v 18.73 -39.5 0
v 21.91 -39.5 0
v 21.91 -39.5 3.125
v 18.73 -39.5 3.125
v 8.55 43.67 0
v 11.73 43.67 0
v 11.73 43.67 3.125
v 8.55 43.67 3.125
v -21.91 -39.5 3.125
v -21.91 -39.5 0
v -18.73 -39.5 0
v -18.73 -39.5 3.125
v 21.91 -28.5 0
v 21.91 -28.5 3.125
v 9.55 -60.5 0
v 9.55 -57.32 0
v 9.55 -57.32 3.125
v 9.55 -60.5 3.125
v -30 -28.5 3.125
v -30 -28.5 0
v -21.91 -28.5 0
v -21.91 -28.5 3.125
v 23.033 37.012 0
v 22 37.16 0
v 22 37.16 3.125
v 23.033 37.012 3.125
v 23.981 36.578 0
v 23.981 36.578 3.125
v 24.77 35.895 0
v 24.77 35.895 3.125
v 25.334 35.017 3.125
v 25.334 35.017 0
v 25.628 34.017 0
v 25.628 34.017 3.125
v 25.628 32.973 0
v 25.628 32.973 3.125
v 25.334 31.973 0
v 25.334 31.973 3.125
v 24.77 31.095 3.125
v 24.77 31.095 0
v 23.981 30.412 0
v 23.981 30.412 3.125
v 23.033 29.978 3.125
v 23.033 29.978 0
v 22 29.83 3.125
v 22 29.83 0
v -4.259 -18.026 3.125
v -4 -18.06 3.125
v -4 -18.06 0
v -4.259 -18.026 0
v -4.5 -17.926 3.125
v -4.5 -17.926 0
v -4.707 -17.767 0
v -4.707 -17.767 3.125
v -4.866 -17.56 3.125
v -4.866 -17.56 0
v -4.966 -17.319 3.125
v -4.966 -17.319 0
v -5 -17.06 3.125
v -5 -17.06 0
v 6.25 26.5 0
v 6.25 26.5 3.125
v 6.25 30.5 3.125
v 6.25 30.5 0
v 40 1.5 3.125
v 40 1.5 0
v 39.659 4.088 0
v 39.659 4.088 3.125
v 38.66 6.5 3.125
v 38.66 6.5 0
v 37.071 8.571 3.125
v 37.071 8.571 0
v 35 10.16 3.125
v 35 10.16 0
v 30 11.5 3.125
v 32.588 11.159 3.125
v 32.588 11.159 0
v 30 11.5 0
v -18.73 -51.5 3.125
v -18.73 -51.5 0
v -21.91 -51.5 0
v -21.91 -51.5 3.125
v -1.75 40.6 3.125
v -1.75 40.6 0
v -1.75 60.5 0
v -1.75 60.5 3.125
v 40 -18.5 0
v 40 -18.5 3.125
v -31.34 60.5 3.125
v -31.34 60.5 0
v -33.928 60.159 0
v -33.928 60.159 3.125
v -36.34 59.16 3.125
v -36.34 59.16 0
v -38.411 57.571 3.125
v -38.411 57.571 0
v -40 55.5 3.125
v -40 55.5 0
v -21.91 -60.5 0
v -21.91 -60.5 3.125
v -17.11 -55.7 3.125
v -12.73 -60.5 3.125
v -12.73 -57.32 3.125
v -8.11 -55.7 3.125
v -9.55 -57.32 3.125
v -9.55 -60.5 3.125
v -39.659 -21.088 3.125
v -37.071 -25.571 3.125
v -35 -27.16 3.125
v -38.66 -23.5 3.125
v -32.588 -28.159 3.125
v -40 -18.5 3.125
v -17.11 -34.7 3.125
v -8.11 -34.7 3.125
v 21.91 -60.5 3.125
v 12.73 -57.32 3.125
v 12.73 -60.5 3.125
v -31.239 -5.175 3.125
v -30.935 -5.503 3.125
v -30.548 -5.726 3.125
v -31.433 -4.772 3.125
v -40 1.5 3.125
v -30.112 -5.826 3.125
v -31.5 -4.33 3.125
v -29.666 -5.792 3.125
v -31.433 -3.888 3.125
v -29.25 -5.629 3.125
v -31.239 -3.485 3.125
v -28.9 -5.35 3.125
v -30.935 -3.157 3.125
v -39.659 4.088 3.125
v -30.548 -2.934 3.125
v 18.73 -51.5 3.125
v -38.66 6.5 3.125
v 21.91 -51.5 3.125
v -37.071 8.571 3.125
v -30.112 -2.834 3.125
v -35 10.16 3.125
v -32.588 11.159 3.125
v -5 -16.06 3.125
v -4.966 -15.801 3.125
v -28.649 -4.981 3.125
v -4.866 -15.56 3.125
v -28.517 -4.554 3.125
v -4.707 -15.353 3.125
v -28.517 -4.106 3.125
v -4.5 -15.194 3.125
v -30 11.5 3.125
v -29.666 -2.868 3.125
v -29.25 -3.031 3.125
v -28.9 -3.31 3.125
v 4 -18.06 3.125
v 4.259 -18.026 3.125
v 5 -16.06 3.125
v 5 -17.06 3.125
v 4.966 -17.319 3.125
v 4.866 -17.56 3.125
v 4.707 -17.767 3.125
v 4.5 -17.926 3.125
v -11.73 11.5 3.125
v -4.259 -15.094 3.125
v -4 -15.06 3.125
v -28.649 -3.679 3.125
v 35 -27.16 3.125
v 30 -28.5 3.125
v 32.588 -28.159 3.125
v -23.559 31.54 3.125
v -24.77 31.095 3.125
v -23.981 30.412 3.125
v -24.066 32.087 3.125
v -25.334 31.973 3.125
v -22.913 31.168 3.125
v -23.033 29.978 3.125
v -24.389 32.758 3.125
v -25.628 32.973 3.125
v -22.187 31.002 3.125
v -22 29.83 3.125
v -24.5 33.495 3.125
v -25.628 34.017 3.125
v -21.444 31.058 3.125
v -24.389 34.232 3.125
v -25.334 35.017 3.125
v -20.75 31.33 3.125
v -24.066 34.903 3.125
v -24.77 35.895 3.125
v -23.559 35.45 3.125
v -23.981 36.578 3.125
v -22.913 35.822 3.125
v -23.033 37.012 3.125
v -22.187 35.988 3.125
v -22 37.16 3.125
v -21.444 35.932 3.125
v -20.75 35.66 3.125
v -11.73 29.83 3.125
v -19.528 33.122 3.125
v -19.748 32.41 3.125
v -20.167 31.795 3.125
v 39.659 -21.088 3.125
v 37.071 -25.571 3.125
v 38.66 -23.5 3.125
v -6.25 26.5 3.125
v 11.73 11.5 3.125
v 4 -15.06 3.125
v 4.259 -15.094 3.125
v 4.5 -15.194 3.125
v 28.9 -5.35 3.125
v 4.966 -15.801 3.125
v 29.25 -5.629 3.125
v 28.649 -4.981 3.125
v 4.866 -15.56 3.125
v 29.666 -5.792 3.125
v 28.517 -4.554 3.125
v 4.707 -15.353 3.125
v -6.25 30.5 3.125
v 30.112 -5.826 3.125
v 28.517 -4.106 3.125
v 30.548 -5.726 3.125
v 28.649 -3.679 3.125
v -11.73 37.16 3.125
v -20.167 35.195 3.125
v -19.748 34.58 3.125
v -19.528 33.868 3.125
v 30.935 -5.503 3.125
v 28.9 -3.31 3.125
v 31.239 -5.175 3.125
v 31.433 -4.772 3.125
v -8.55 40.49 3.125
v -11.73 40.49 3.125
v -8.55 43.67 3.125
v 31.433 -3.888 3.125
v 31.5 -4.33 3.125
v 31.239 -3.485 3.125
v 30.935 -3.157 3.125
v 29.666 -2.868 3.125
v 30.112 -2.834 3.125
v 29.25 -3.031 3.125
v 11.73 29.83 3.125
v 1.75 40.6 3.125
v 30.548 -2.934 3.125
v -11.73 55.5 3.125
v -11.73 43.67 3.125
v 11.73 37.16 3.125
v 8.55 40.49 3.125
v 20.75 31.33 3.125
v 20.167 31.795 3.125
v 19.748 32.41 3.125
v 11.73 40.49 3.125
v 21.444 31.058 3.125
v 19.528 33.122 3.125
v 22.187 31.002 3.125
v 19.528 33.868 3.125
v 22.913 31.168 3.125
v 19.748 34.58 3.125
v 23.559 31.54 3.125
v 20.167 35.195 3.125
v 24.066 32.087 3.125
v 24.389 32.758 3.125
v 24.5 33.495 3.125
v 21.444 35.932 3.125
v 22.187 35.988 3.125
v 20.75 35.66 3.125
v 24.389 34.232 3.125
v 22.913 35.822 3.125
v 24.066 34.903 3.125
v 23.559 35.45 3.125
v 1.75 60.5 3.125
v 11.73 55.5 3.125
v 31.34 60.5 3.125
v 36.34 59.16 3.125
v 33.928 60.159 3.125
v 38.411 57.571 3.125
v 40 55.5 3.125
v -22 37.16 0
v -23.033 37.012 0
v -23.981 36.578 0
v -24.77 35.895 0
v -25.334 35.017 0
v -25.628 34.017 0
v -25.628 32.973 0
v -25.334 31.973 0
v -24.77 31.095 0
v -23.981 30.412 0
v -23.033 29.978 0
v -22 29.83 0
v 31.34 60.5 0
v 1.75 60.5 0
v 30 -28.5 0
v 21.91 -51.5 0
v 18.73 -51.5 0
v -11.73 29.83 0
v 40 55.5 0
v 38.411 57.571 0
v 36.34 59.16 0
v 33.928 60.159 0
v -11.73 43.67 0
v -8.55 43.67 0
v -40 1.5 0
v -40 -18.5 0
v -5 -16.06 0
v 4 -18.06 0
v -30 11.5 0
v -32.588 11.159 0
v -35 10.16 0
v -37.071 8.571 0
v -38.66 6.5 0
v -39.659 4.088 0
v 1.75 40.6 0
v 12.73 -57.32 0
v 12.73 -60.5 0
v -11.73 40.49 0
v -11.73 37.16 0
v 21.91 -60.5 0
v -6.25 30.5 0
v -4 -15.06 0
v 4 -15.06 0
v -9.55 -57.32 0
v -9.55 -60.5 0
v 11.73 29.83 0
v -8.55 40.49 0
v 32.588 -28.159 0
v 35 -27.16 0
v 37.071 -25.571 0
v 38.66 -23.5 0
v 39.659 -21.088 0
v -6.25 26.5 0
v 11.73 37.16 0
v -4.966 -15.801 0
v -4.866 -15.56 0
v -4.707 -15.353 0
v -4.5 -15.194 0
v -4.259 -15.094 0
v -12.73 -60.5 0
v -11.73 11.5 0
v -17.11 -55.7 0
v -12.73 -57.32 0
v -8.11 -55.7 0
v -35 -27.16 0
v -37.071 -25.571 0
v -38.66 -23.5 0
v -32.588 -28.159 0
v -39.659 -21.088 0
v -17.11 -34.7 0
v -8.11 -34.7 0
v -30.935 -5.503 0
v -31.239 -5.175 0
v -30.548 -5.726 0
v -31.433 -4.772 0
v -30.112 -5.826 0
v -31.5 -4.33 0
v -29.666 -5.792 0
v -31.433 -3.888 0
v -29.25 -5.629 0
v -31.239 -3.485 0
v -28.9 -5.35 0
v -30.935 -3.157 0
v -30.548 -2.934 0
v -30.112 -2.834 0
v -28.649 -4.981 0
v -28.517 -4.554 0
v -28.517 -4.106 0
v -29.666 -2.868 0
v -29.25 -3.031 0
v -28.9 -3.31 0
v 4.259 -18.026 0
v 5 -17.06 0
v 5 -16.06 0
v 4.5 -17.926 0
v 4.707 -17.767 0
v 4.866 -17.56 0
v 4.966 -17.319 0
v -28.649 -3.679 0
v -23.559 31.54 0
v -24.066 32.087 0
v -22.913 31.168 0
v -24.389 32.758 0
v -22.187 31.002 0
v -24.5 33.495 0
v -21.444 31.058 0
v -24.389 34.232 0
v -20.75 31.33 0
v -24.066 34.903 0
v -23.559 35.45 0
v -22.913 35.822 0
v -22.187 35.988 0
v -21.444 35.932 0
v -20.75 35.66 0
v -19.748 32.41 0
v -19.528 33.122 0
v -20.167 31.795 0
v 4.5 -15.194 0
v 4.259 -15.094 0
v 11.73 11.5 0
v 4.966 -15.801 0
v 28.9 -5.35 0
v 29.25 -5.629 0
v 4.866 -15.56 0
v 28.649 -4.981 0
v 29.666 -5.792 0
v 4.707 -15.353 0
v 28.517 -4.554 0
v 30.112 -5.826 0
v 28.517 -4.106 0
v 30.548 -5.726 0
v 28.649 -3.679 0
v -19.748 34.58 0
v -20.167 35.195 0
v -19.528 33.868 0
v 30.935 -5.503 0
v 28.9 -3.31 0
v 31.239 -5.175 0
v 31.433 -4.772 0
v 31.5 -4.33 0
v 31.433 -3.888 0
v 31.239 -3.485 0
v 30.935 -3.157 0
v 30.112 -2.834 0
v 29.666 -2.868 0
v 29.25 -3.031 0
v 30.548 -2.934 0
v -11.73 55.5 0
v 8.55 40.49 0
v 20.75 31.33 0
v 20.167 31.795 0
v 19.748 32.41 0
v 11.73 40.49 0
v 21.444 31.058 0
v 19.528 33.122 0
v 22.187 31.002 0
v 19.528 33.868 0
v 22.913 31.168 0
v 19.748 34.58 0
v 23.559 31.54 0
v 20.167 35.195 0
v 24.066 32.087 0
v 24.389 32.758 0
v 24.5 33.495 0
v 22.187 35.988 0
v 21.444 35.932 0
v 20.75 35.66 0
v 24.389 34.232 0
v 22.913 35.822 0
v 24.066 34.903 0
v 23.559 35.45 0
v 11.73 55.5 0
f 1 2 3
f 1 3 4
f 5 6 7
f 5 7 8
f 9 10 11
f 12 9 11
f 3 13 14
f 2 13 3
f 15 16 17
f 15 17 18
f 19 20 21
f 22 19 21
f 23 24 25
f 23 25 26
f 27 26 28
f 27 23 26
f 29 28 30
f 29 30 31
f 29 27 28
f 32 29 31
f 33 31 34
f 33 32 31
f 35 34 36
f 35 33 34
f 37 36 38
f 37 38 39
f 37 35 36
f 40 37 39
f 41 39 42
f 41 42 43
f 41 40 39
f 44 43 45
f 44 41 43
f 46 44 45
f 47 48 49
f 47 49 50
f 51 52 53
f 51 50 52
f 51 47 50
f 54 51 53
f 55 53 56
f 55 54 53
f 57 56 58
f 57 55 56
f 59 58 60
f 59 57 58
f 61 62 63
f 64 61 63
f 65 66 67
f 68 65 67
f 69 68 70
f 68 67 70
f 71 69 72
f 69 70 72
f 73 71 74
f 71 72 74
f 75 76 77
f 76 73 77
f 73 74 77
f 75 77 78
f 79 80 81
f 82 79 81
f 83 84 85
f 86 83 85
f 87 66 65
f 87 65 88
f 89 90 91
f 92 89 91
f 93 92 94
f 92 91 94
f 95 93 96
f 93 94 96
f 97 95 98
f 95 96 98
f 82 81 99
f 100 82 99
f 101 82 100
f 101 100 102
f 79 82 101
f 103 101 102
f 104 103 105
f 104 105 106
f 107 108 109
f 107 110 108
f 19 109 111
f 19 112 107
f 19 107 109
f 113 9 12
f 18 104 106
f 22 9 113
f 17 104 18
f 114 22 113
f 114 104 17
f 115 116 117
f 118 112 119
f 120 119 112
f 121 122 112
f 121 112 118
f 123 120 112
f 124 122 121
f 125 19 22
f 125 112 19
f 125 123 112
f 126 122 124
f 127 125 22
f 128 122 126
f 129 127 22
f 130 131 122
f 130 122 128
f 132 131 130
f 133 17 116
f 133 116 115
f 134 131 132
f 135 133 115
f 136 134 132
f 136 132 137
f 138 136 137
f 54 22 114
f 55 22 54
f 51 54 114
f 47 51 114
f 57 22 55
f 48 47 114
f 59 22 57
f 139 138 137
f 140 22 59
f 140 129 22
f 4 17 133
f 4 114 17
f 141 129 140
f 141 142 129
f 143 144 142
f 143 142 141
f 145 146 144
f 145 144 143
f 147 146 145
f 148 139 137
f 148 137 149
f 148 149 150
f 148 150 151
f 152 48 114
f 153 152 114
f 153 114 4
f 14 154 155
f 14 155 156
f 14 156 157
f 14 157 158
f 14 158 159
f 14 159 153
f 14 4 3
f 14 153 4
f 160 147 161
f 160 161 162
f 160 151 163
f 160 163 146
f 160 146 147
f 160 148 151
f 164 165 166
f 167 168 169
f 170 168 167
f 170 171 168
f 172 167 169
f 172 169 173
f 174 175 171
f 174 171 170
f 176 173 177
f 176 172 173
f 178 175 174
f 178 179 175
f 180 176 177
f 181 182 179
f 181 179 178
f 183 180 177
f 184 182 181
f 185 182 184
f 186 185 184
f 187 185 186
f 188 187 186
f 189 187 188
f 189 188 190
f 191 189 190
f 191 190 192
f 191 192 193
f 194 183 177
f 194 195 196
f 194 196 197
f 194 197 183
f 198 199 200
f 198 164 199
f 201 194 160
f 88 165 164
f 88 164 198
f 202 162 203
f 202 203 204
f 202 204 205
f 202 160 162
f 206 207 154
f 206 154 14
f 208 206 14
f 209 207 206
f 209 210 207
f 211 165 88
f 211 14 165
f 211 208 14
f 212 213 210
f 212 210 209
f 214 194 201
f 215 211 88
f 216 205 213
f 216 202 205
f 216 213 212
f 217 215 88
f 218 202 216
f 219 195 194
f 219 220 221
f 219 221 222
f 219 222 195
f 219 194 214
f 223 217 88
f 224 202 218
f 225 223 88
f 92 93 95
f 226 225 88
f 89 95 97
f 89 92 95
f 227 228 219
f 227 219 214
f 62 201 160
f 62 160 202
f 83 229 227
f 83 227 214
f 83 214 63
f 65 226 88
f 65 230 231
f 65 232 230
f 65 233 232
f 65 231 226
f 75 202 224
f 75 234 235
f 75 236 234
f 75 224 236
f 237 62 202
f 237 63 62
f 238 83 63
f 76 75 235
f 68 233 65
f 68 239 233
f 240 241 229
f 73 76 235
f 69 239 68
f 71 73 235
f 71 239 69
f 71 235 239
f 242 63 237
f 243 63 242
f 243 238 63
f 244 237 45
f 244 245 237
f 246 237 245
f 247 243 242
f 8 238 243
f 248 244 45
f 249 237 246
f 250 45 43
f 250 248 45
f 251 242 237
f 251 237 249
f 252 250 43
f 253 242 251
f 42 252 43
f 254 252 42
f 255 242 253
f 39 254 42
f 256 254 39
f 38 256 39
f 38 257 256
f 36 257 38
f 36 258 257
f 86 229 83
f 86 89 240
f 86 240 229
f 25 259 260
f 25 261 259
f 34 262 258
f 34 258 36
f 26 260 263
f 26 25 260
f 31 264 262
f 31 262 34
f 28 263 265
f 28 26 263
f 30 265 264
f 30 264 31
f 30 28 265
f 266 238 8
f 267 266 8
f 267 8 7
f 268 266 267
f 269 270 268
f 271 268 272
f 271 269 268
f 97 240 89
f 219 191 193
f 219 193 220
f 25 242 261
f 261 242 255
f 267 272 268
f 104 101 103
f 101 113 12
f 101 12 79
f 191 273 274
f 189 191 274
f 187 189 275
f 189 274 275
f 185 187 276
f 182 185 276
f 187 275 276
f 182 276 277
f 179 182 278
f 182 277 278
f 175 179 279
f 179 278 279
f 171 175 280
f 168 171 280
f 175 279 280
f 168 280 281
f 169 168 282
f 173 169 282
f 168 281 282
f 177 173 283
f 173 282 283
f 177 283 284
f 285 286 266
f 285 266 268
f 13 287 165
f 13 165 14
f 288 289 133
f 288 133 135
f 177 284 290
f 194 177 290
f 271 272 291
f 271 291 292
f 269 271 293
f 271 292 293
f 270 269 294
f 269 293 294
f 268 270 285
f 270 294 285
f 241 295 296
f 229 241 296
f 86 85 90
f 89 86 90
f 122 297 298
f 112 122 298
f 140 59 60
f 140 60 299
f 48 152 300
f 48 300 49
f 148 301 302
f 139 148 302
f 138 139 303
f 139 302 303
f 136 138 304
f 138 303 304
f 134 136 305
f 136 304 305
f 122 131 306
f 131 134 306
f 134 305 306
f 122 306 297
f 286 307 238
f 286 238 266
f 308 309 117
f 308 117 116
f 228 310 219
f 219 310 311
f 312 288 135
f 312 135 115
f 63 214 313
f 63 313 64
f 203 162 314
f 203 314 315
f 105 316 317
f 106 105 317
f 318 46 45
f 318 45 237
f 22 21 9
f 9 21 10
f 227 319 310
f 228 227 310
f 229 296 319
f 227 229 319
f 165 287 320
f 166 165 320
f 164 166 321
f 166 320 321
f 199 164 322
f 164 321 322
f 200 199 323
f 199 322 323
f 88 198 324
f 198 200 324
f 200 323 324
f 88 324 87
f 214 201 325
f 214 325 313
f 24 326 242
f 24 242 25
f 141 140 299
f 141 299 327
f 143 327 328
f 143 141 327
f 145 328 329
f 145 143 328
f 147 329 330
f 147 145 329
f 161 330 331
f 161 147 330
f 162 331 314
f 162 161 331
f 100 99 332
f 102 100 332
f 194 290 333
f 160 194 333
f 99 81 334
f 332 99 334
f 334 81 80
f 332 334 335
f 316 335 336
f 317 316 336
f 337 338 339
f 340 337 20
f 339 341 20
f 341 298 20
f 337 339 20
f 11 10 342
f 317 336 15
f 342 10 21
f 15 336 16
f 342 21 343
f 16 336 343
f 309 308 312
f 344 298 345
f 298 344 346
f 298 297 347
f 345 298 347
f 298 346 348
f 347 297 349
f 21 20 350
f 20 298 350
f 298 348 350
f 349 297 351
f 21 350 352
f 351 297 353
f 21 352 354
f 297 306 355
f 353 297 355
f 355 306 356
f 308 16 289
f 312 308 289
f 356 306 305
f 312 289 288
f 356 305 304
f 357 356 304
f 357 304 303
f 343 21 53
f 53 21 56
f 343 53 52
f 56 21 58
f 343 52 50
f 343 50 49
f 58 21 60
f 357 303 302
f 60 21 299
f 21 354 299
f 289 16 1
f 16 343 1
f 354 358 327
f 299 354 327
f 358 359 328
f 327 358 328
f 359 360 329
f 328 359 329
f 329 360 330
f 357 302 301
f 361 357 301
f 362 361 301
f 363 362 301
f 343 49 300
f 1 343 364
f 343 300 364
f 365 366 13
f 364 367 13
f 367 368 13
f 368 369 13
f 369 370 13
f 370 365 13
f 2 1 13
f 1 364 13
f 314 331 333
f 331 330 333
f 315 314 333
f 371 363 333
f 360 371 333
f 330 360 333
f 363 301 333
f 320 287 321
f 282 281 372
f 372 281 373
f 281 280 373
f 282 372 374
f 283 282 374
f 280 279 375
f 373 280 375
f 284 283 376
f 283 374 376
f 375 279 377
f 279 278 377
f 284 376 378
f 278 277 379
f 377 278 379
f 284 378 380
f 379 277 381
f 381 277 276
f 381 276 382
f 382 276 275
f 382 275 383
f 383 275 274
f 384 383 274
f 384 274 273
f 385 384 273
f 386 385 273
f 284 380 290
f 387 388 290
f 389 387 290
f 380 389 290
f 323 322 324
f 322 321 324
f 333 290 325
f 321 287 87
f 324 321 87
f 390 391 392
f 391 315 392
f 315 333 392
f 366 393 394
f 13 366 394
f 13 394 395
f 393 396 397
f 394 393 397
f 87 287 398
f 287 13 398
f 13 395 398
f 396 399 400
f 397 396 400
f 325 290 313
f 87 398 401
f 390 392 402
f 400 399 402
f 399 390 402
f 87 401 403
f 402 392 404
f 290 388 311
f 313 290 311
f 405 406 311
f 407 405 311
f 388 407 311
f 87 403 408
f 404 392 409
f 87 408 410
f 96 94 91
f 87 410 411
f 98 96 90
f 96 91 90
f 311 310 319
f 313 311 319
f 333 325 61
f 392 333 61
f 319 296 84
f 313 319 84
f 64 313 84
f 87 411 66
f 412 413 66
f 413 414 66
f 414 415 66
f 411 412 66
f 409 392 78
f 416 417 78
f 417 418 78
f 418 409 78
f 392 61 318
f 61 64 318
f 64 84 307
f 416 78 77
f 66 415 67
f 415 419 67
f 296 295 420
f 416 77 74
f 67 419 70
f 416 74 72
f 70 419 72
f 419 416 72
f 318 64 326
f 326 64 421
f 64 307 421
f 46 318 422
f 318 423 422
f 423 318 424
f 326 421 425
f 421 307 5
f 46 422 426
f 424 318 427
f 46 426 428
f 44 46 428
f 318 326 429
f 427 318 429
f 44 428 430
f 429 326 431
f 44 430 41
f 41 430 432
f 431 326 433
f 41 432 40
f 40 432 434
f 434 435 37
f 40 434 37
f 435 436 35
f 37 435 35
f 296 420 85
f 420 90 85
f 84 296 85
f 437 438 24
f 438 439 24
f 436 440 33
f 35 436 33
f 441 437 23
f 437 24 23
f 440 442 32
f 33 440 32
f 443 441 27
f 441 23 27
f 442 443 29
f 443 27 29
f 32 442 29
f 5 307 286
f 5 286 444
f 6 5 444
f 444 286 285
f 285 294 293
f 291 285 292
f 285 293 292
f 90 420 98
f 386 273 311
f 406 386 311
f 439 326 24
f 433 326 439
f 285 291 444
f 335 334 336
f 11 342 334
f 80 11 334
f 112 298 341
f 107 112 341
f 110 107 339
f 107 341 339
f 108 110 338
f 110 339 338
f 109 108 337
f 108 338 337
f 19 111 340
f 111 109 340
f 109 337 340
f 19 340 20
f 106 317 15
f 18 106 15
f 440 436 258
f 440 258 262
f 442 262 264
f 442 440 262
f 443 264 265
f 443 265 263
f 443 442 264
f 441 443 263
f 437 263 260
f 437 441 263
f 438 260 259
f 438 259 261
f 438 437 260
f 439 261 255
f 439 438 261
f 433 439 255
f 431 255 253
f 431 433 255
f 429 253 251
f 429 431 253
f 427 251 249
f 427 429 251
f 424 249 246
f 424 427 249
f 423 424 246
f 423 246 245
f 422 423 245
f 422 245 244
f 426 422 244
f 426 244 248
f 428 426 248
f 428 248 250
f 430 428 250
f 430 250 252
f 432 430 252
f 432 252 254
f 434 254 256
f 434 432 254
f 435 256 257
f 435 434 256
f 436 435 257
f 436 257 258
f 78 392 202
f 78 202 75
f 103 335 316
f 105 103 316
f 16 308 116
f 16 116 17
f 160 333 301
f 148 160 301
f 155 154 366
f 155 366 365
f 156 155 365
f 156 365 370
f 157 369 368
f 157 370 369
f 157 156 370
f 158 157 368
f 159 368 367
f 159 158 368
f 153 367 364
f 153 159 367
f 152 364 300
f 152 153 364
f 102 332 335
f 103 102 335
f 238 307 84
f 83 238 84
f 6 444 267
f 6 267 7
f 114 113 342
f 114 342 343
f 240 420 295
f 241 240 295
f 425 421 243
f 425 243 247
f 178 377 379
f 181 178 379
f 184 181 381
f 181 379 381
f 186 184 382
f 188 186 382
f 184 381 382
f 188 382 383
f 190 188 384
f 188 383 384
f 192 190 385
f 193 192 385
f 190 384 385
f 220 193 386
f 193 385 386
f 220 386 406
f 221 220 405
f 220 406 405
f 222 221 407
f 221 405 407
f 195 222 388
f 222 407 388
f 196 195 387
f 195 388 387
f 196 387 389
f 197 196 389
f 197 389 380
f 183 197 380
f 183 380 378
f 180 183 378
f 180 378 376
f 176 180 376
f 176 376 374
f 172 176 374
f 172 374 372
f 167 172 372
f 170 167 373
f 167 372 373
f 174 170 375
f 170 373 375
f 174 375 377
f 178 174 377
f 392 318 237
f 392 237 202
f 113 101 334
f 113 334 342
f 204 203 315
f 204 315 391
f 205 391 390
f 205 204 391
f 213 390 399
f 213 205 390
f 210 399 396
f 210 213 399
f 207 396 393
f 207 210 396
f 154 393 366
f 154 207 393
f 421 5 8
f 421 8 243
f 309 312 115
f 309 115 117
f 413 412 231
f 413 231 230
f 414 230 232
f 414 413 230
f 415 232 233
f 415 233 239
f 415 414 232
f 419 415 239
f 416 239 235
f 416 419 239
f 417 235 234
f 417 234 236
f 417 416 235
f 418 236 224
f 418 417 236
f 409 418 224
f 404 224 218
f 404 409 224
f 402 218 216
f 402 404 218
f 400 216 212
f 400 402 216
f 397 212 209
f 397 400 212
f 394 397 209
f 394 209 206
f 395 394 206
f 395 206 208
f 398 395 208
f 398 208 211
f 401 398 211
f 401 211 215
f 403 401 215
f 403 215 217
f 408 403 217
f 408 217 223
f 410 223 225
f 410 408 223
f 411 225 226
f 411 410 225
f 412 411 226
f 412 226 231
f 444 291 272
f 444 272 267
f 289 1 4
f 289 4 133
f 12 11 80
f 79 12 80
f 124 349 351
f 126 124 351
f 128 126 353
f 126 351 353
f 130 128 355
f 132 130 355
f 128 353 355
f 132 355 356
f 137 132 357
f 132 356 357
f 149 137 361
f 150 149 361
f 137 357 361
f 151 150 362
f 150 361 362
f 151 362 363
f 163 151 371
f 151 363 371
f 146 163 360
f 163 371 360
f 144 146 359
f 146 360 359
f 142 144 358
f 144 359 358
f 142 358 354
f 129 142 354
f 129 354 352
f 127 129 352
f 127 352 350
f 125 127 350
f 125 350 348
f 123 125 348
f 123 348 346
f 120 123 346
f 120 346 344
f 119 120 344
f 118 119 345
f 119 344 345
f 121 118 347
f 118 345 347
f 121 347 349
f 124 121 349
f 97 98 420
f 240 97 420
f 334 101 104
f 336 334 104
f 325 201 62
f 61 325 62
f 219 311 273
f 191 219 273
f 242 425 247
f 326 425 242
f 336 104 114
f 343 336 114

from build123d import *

# Parameters (mm, degrees)
SKETCH3_R           = 2.5
SKETCH3_R_2         = 1.5
BOSS_EXTRUDE1_DEPTH = 3.125
FILLET1_R           = 10
SKETCH4_W           = 12.5
SKETCH4_H           = 4
SKETCH4_W_2         = 9
SKETCH4_H_2         = 21
CUT_EXTRUDE2_DEPTH  = 73.594873269


with BuildPart() as part:
    # Sketch3 → Boss-Extrude1 (new body)
    with BuildSketch(Plane.XY):
        with BuildLine():
            Line((0, 23.314265754), (0, 40.6))
            Line((0, 40.6), (1.75, 40.6))
            Line((1.75, 40.6), (1.75, 60.5))
            Line((1.75, 60.5), (40, 60.5))
            Line((40, 60.5), (40, 55.5))
            Line((40, 55.5), (11.73, 55.5))
            Line((11.73, 55.5), (11.73, 43.67))
            Line((11.73, 43.67), (8.55, 43.67))
            Line((8.55, 43.67), (8.55, 40.49))
            Line((8.55, 40.49), (11.73, 40.49))
            Line((11.73, 40.49), (11.73, 37.16))
            Line((11.73, 37.16), (22, 37.16))
            ThreePointArc((22, 37.16), (25.665, 33.495), (22, 29.83))
            Line((22, 29.83), (11.73, 29.83))
            Line((11.73, 29.83), (11.73, 11.5))
            Line((11.73, 11.5), (40, 11.5))
            Line((40, 11.5), (40, -28.5))
            Line((40, -28.5), (21.91, -28.5))
            Line((21.91, -28.5), (21.91, -39.5))
            Line((21.91, -39.5), (18.73, -39.5))
            Line((18.73, -39.5), (18.73, -51.5))
            Line((18.73, -51.5), (21.91, -51.5))
            Line((21.91, -51.5), (21.91, -60.5))
            Line((21.91, -60.5), (12.73, -60.5))
            Line((12.73, -60.5), (12.73, -57.32))
            Line((12.73, -57.32), (9.55, -57.32))
            Line((9.55, -57.32), (9.55, -60.5))
            Line((9.55, -60.5), (0, -60.5))
            Line((0, -60.5), (0, 23.314265754))
        make_face()
        with Locations((22, 33.495)):
            Circle(SKETCH3_R, mode=Mode.SUBTRACT)
        with Locations((30, -4.33)):
            Circle(SKETCH3_R_2, mode=Mode.SUBTRACT)
    boss_extrude1 = extrude(amount=BOSS_EXTRUDE1_DEPTH)

    # Mirror1: Boss-Extrude1 across plane
    add(boss_extrude1.mirror(Plane(origin=(0, 23.314265754, 3.125), x_dir=(0, 0, 1), z_dir=(1, 0, 0))))

    # Fillet1
    # the kernel refuses this fillet: 10 mm, written as the material it takes off along each edge
    with BuildSketch(Plane(origin=(40, 60.5, -21.650635095), x_dir=(0, -1, 0), z_dir=(0, 0, 1))) as fillet1_piece_1:
        with BuildLine():
            CenterArc((10, -8.660254038), FILLET1_R, 120, 60)
            Line((0, -8.660254038), (-0.2, -8.660254038))
            Line((-0.2, -8.660254038), (-0.2, 0))
            Line((-0.2, 0), (0, 0.2))
            ThreePointArc((0, 0.2), (2.5, 0.2), (4.9, 0.173205081))
            Line((4.9, 0.173205081), (5, 0))
        make_face()
    extrude(amount=46.426270189, mode=Mode.SUBTRACT)
    with BuildSketch(Plane(origin=(40, 11.5, -25), x_dir=(0, -1, 0), z_dir=(0, 0, 1)), Plane(origin=(40, -28.5, -25), x_dir=(-1, 0, 0), z_dir=(0, 0, 1)), Plane(origin=(-40, 11.5, -25), x_dir=(1, 0, 0), z_dir=(0, 0, 1)), Plane(origin=(-40, -28.5, -25), x_dir=(0, 1, 0), z_dir=(0, 0, 1))) as fillet1_piece_2:
        with BuildLine():
            CenterArc((FILLET1_R, -FILLET1_R), FILLET1_R, 90, 90)
            Line((0, -FILLET1_R), (-FILLET1_R * 0.02, -FILLET1_R))
            Line((-FILLET1_R * 0.02, -FILLET1_R), (-FILLET1_R * 0.02, FILLET1_R * 0.02))
            Line((-FILLET1_R * 0.02, FILLET1_R * 0.02), (FILLET1_R, FILLET1_R * 0.02))
            Line((FILLET1_R, FILLET1_R * 0.02), (FILLET1_R, 0))
        make_face()
    extrude(amount=53.125, mode=Mode.SUBTRACT)
    with BuildSketch(Plane(origin=(-40, 60.5, -21.650635095), x_dir=(1, 0, 0), z_dir=(0, 0, 1))) as fillet1_piece_3:
        with BuildLine():
            CenterArc((8.660254038, -10), FILLET1_R, 90, 60)
            Line((0, -5), (-0.173205081, -4.9))
            ThreePointArc((-0.173205081, -4.9), (-0.2, -2.5), (-0.2, 0))
            Line((-0.2, 0), (0, 0.2))
            Line((0, 0.2), (8.660254038, 0.2))
            Line((8.660254038, 0.2), (8.660254038, 0))
        make_face()
    extrude(amount=46.426270189, mode=Mode.SUBTRACT)

    # Sketch4 → Cut-Extrude2 (cut, through all)
    with BuildSketch(Plane.XY.offset(3.125)):
        with Locations((0, 28.5)):
            Rectangle(SKETCH4_W, SKETCH4_H)
        with Locations((-12.61, -45.2)):
            Rectangle(SKETCH4_W_2, SKETCH4_H_2)
        with BuildLine():
            Line((-4, -15.06), (4, -15.06))
            ThreePointArc((4, -15.06), (4.707106781, -15.352893219), (5, -16.06))
            Line((5, -16.06), (5, -17.06))
            ThreePointArc((5, -17.06), (4.707106781, -17.767106781), (4, -18.06))
            Line((4, -18.06), (-4, -18.06))
            ThreePointArc((-4, -18.06), (-4.707106781, -17.767106781), (-5, -17.06))
            Line((-5, -17.06), (-5, -16.06))
            ThreePointArc((-5, -16.06), (-4.707106781, -15.352893219), (-4, -15.06))
        make_face()
    extrude(amount=-CUT_EXTRUDE2_DEPTH, mode=Mode.SUBTRACT)


solid = part.part
